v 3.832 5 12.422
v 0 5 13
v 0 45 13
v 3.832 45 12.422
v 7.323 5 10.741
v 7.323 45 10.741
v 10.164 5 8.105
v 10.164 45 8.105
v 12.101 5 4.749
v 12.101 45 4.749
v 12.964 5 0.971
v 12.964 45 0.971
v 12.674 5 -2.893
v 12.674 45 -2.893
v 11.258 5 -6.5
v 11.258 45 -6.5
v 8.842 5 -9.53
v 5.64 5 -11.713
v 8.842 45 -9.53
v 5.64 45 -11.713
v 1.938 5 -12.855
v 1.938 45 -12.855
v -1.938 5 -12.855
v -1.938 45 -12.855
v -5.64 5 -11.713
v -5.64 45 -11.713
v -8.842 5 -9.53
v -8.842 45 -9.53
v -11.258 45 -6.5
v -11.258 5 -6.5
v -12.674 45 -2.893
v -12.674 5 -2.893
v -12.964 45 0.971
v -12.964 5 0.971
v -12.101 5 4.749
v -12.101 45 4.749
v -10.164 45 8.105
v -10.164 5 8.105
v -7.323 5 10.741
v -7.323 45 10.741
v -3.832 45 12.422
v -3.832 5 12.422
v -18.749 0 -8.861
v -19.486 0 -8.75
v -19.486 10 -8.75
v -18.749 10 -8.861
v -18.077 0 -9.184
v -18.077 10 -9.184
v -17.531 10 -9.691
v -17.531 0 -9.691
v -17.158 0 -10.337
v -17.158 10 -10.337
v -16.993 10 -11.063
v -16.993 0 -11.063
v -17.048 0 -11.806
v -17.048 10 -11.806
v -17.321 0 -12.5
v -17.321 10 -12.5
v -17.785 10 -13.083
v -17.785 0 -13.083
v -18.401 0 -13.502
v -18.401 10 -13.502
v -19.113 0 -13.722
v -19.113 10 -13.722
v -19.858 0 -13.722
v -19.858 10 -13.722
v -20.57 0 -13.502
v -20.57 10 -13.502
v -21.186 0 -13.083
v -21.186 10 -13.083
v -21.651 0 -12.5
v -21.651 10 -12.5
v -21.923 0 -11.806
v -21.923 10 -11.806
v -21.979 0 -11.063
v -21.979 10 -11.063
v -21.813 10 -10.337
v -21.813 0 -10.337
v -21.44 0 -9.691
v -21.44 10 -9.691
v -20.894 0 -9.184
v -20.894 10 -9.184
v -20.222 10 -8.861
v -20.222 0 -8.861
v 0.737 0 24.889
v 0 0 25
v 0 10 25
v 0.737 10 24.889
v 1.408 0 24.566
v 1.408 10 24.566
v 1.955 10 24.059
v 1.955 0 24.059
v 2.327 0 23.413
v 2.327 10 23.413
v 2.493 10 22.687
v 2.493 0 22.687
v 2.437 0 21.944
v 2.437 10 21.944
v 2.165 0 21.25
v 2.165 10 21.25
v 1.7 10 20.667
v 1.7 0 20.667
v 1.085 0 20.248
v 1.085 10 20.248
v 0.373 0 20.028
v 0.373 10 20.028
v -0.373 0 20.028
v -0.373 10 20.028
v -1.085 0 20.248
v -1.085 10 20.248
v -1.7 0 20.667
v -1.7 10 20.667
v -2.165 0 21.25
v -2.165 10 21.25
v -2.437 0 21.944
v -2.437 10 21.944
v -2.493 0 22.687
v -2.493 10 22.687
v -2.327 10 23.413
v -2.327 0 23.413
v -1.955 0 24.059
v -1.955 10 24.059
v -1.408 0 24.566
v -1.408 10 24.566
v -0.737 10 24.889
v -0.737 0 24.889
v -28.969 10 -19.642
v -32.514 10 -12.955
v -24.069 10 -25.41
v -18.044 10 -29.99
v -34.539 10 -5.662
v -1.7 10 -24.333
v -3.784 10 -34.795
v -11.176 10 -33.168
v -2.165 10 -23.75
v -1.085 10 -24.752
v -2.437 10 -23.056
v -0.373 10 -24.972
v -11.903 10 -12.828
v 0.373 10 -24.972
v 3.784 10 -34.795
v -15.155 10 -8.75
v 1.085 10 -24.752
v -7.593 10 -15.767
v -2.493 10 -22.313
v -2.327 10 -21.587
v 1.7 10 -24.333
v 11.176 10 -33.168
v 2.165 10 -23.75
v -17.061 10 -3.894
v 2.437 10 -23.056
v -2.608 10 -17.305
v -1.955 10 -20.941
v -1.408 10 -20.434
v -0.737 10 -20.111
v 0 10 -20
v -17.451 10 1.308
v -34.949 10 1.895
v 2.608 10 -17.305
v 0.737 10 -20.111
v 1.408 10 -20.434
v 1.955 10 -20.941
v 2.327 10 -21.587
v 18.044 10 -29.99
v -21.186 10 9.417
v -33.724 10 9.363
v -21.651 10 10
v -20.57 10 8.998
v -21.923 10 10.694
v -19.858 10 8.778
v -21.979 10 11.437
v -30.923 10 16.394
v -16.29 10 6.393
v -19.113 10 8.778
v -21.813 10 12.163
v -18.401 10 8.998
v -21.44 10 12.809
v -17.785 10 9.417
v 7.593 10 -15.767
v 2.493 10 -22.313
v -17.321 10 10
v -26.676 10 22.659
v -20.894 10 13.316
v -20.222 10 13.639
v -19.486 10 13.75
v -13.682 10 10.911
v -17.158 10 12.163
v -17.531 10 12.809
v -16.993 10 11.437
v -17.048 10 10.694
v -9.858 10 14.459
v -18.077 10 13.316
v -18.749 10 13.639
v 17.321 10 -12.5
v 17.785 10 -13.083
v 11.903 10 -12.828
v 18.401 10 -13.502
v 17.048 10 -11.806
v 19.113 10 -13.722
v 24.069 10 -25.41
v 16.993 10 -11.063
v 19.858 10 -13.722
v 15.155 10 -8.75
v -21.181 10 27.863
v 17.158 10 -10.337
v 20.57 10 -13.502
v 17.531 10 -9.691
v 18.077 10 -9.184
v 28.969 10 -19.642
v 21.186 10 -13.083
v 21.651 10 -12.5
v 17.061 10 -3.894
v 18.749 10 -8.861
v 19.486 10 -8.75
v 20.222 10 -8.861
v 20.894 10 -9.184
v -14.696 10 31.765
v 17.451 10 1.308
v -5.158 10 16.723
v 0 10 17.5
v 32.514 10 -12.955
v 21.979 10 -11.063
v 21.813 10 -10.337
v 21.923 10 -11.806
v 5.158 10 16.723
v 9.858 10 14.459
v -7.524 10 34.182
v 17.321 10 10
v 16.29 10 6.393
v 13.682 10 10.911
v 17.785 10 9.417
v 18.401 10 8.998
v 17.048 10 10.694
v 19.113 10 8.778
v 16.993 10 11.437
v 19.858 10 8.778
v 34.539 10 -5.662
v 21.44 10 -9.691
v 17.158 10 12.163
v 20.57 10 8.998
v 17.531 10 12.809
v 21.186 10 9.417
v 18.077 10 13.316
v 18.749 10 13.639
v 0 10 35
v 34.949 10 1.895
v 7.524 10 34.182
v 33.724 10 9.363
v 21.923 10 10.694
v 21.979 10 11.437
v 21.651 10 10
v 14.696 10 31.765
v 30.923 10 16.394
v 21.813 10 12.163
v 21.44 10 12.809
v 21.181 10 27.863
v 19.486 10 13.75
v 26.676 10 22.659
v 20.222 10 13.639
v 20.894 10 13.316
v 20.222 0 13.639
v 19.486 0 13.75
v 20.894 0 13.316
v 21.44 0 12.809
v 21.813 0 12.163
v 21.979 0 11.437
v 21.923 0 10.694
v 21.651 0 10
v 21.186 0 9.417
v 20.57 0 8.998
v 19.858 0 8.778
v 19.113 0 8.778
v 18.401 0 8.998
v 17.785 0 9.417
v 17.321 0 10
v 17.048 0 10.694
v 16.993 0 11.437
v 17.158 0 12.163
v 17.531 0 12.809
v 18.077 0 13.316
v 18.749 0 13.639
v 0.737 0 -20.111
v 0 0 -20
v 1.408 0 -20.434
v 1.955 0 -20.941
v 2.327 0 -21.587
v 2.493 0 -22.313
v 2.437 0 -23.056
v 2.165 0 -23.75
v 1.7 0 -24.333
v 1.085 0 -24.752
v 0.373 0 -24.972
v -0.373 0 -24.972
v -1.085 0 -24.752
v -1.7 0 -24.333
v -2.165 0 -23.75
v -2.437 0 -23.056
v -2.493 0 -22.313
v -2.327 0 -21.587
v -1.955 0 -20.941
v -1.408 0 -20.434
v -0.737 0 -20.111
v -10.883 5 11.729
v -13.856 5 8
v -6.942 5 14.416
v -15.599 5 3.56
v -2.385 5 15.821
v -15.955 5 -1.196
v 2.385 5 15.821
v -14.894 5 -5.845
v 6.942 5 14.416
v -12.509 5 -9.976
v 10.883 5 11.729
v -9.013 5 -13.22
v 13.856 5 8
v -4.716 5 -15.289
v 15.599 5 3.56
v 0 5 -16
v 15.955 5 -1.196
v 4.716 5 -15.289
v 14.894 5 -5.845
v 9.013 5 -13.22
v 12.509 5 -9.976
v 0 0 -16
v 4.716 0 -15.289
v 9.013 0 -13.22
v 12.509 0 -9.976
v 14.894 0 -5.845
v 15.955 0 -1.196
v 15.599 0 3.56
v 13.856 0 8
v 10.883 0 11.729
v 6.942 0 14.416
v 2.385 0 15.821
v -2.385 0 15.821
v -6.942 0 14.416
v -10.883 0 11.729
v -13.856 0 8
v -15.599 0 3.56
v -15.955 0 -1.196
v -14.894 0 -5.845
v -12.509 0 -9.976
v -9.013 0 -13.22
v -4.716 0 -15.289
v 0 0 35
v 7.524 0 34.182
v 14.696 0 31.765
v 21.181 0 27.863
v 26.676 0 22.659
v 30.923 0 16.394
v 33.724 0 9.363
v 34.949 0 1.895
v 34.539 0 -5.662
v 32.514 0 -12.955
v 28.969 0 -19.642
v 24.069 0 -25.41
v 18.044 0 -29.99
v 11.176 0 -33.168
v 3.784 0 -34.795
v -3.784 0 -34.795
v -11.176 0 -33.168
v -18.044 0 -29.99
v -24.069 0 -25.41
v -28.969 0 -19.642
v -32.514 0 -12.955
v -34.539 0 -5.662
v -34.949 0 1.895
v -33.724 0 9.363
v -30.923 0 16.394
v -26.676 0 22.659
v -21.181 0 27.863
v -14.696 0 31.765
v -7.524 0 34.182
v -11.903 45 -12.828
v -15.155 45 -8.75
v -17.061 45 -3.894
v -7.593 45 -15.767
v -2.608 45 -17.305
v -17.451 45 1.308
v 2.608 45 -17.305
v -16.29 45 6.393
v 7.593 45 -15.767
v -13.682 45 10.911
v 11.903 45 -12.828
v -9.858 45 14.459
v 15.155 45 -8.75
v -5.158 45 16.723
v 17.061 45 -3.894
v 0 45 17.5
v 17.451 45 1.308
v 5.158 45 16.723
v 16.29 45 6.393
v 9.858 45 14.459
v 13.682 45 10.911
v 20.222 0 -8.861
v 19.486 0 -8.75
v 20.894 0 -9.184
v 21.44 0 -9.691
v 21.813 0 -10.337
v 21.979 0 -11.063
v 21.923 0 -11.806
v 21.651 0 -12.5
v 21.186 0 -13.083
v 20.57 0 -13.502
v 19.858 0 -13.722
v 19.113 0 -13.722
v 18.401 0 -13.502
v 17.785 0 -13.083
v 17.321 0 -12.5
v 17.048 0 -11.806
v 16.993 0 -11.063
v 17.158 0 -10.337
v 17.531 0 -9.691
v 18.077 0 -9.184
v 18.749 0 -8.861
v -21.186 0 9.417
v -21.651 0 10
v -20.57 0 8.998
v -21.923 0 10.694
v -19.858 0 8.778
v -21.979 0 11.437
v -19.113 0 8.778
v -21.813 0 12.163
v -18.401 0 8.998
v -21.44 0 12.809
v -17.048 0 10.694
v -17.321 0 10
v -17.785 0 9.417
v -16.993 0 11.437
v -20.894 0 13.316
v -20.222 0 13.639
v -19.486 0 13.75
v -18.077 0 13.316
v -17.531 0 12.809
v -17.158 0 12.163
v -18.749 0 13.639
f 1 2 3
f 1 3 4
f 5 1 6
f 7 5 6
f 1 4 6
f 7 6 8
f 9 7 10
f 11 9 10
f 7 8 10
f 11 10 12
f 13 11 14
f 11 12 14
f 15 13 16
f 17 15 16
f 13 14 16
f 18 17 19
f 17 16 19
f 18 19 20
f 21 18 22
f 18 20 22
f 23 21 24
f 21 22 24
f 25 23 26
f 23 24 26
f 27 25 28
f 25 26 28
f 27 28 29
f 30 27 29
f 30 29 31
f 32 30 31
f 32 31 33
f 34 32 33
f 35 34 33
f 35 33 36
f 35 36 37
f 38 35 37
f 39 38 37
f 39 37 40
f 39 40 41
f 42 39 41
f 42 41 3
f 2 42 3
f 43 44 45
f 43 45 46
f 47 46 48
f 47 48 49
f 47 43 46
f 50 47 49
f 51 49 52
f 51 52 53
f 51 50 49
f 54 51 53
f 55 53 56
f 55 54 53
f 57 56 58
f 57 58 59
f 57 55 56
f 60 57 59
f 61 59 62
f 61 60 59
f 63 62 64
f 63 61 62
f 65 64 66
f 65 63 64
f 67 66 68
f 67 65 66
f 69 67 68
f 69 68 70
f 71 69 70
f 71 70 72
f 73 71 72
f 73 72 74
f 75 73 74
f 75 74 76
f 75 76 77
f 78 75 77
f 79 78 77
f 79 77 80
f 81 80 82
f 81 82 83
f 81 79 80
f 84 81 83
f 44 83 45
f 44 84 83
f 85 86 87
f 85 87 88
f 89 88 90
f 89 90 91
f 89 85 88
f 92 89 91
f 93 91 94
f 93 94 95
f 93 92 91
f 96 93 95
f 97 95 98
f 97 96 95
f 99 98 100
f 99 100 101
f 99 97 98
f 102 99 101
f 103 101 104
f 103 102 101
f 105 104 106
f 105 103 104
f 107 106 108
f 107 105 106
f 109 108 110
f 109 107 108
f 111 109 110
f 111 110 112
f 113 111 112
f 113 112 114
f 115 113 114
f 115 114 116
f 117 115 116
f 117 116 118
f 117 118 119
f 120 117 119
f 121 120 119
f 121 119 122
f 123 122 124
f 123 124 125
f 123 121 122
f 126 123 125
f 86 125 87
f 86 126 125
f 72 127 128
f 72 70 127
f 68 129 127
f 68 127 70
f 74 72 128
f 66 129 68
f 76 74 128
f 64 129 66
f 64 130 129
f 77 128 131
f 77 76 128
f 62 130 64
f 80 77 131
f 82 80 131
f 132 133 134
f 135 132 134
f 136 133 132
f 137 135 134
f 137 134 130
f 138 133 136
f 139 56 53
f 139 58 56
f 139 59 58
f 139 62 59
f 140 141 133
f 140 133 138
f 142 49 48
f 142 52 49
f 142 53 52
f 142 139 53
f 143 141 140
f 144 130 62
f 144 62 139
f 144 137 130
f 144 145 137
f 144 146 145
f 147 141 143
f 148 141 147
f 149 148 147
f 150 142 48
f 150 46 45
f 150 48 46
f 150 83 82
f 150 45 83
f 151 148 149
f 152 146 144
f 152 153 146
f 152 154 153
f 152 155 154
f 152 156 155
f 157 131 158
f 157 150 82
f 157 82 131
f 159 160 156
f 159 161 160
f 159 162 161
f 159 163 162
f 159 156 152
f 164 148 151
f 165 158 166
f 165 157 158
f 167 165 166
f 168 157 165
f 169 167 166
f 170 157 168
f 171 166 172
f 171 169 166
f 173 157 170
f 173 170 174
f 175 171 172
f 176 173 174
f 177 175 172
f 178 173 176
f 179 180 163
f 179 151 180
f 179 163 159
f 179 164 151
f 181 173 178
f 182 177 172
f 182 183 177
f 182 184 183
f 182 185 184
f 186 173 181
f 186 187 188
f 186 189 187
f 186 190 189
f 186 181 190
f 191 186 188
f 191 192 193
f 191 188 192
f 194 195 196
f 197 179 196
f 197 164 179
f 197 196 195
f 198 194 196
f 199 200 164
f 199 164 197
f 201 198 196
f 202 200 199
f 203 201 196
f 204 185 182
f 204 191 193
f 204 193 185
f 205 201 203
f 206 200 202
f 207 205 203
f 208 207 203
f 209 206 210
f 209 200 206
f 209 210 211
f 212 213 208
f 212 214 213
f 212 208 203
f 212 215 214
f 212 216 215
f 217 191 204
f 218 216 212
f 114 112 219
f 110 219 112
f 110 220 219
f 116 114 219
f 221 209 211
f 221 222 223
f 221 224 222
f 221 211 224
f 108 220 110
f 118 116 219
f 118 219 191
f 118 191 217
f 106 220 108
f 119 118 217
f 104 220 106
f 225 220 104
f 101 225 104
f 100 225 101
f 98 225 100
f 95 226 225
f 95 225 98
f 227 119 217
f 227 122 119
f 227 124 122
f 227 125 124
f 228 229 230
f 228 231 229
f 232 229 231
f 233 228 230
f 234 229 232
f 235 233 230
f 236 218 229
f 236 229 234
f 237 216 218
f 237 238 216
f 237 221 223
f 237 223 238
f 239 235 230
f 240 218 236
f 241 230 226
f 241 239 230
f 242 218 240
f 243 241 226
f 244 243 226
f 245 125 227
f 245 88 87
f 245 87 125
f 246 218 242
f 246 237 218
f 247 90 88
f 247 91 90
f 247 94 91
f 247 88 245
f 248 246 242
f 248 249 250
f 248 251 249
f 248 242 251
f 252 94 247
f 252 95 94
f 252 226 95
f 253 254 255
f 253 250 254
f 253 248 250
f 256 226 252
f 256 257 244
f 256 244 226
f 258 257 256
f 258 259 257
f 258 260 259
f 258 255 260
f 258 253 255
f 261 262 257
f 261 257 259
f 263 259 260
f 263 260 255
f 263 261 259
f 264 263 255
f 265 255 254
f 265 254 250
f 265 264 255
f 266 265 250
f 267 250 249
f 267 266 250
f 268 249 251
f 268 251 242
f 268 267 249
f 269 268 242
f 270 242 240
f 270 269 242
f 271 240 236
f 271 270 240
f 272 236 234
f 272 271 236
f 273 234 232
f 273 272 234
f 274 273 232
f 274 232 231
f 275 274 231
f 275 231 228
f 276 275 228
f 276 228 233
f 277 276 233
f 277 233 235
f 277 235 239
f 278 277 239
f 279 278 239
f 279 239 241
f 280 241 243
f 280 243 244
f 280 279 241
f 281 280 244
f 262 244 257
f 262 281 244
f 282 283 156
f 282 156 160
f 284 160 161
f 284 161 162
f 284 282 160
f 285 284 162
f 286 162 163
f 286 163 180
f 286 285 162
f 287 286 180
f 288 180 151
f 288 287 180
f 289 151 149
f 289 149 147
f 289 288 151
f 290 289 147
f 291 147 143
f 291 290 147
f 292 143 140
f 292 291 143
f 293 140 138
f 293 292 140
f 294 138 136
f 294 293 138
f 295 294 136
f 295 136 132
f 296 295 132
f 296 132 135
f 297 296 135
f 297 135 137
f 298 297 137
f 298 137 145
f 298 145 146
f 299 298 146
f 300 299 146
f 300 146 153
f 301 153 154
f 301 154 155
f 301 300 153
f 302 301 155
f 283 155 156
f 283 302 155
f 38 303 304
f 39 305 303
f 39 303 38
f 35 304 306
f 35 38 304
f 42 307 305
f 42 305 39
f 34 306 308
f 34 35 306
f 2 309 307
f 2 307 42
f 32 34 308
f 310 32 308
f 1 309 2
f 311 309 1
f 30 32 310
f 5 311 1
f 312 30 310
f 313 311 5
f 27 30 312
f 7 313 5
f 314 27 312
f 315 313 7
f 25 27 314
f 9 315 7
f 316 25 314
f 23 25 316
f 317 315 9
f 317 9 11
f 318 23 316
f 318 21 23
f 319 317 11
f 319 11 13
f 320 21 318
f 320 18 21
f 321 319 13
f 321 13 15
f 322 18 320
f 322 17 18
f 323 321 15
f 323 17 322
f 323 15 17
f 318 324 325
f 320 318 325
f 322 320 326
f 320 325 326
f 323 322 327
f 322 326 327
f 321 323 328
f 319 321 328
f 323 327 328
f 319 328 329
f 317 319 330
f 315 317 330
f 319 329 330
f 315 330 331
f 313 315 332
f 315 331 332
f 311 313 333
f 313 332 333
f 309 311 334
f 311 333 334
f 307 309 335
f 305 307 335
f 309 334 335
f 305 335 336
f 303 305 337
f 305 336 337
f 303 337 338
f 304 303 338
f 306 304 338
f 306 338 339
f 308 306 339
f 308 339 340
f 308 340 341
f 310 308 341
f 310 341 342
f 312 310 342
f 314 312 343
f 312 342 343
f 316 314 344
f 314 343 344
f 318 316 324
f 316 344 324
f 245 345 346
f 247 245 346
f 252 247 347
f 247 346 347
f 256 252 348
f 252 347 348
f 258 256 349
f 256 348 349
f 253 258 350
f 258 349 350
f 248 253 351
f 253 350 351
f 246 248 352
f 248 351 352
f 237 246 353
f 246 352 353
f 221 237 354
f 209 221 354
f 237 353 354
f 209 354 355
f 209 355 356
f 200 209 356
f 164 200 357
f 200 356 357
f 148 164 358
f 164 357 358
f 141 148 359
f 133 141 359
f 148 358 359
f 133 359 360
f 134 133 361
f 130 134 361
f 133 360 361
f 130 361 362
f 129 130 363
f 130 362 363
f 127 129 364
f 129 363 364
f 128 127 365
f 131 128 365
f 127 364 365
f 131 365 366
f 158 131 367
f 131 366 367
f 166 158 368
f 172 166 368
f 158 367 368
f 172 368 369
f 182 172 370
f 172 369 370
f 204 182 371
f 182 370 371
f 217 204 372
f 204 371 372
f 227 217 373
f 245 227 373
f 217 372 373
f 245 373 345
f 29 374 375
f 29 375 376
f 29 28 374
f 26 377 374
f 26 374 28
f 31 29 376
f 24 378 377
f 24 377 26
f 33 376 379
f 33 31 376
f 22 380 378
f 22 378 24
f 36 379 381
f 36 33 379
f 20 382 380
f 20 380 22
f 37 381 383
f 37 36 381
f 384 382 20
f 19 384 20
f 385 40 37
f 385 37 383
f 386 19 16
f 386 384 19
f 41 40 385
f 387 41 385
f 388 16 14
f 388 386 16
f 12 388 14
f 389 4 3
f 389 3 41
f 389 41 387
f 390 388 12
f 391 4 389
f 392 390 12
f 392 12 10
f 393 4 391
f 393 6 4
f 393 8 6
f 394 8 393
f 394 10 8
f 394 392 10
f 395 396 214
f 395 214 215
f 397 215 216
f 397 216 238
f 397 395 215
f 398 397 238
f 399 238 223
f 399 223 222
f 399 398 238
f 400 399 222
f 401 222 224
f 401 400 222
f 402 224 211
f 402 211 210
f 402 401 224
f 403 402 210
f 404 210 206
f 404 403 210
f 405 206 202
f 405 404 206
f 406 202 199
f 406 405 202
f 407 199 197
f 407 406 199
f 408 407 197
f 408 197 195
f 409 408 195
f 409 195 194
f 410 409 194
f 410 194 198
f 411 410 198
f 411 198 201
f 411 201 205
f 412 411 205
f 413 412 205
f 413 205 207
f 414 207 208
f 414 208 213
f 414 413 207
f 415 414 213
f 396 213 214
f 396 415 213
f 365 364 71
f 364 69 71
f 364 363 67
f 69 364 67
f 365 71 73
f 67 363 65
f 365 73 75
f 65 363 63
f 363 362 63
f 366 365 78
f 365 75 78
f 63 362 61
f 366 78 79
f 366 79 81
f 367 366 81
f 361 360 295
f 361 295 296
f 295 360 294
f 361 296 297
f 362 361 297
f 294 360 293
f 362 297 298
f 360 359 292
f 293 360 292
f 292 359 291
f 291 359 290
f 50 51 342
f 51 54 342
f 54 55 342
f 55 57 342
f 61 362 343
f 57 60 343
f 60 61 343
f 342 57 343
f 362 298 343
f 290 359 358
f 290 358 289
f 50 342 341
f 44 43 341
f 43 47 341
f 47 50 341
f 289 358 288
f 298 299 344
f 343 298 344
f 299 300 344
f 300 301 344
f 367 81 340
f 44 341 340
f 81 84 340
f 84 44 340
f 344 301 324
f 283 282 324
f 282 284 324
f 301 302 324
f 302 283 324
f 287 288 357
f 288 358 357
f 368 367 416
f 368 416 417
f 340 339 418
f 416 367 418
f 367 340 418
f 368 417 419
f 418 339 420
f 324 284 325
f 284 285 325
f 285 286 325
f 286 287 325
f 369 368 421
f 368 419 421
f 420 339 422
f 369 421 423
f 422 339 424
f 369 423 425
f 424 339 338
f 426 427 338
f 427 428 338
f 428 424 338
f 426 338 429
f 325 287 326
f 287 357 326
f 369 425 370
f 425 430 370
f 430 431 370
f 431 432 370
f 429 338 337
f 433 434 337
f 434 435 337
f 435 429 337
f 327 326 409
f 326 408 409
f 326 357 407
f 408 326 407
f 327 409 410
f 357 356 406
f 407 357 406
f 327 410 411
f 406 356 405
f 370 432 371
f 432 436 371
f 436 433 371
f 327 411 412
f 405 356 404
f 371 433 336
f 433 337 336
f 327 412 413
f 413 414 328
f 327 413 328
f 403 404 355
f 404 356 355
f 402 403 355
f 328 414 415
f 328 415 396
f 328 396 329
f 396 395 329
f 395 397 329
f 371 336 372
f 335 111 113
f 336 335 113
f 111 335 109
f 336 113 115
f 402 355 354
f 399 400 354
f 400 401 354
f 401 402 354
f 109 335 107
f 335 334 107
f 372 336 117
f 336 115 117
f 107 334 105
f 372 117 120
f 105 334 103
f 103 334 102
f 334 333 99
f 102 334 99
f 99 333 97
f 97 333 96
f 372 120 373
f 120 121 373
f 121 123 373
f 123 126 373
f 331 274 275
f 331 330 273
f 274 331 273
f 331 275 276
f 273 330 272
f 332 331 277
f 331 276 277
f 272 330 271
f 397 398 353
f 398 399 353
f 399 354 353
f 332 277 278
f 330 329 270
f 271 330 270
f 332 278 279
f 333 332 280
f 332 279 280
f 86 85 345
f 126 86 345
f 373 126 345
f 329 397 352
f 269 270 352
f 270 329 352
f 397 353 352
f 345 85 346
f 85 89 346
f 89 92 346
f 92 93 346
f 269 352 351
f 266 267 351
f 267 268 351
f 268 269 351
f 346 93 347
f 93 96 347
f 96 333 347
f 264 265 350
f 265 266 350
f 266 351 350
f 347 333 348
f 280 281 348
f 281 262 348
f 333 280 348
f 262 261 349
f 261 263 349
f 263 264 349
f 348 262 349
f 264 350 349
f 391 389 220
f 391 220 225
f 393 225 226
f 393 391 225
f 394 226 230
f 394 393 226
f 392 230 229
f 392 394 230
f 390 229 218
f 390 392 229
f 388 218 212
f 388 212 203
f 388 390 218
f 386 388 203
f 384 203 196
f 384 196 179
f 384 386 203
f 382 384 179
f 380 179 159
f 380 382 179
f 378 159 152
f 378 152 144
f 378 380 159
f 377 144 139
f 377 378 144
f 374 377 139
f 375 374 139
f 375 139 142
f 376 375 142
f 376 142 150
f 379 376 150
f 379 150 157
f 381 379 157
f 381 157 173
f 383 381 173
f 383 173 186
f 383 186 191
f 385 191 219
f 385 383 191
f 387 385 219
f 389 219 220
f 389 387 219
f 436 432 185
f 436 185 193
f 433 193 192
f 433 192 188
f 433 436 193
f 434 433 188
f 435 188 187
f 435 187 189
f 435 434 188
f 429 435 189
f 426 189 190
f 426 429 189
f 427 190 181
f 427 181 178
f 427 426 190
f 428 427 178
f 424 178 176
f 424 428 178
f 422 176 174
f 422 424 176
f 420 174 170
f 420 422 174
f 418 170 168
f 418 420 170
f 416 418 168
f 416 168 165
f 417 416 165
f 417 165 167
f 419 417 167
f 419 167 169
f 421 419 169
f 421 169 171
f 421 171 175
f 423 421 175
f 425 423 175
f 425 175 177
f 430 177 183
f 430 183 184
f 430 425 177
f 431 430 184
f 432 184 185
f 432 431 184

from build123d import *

# Parameters (mm, degrees)
SKETCH1_R           = 35
SKETCH1_R_2         = 5
SKETCH1_R_3         = 2.5
BOSS_EXTRUDE1_DEPTH = 10
SKETCH2_R           = 16
CUT_EXTRUDE1_DEPTH  = 5
SKETCH5_R           = 13
CUT_EXTRUDE2_DEPTH  = 5
BOSS_EXTRUDE2_START = 35
SKETCH6_R           = 17.5
SKETCH6_R_2         = 13
BOSS_EXTRUDE2_DEPTH = 35


with BuildPart() as part:
    # Sketch1 → Boss-Extrude1 (new body)
    with BuildSketch(Plane(origin=(0, 0, 0), x_dir=(1, 0, 0), z_dir=(0, 1, 0))):
        with Locations(Location((0, 0, 0), (0, 0, 270))):
            Circle(SKETCH1_R)
        with Locations(Location((0, 0, 0), (0, 0, 270))):
            Circle(SKETCH1_R_2, mode=Mode.SUBTRACT)
        with Locations(Location((0, 22.5, 0), (0, 0, 270))):
            Circle(SKETCH1_R_3, mode=Mode.SUBTRACT)
        with Locations(Location((19.485571585, 11.25, 0), (0, 0, 270))):
            Circle(SKETCH1_R_3, mode=Mode.SUBTRACT)
        with Locations(Location((19.485571585, -11.25, 0), (0, 0, 270))):
            Circle(SKETCH1_R_3, mode=Mode.SUBTRACT)
        with Locations(Location((0, -22.5, 0), (0, 0, 270))):
            Circle(SKETCH1_R_3, mode=Mode.SUBTRACT)
        with Locations(Location((-19.485571585, -11.25, 0), (0, 0, 270))):
            Circle(SKETCH1_R_3, mode=Mode.SUBTRACT)
        with Locations(Location((-19.485571585, 11.25, 0), (0, 0, 270))):
            Circle(SKETCH1_R_3, mode=Mode.SUBTRACT)
    extrude(amount=BOSS_EXTRUDE1_DEPTH)

    # Sketch2 → Cut-Extrude1 (cut)
    with BuildSketch(Plane.XZ):
        with Locations(Location((0, 0, 0), (0, 0, 270))):
            Circle(SKETCH2_R)
    extrude(amount=-CUT_EXTRUDE1_DEPTH, mode=Mode.SUBTRACT)

    # Sketch5 → Cut-Extrude2 (cut)
    with BuildSketch(Plane(origin=(0, 10, 0), x_dir=(1, 0, 0), z_dir=(0, 1, 0))):
        with Locations(Location((0, 0, 0), (0, 0, 270))):
            Circle(SKETCH5_R)
    extrude(amount=-CUT_EXTRUDE2_DEPTH, mode=Mode.SUBTRACT)

    # Sketch6 → Boss-Extrude2 (add)
    with BuildSketch(Plane(origin=(0, 10, 0), x_dir=(1, 0, 0), z_dir=(0, 1, 0)).offset(BOSS_EXTRUDE2_START)):
        with Locations(Location((0, 0, 0), (0, 0, 270))):
            Circle(SKETCH6_R)
        with Locations(Location((0, 0, 0), (0, 0, 270))):
            Circle(SKETCH6_R_2, mode=Mode.SUBTRACT)
    extrude(amount=-BOSS_EXTRUDE2_DEPTH)


solid = part.part
